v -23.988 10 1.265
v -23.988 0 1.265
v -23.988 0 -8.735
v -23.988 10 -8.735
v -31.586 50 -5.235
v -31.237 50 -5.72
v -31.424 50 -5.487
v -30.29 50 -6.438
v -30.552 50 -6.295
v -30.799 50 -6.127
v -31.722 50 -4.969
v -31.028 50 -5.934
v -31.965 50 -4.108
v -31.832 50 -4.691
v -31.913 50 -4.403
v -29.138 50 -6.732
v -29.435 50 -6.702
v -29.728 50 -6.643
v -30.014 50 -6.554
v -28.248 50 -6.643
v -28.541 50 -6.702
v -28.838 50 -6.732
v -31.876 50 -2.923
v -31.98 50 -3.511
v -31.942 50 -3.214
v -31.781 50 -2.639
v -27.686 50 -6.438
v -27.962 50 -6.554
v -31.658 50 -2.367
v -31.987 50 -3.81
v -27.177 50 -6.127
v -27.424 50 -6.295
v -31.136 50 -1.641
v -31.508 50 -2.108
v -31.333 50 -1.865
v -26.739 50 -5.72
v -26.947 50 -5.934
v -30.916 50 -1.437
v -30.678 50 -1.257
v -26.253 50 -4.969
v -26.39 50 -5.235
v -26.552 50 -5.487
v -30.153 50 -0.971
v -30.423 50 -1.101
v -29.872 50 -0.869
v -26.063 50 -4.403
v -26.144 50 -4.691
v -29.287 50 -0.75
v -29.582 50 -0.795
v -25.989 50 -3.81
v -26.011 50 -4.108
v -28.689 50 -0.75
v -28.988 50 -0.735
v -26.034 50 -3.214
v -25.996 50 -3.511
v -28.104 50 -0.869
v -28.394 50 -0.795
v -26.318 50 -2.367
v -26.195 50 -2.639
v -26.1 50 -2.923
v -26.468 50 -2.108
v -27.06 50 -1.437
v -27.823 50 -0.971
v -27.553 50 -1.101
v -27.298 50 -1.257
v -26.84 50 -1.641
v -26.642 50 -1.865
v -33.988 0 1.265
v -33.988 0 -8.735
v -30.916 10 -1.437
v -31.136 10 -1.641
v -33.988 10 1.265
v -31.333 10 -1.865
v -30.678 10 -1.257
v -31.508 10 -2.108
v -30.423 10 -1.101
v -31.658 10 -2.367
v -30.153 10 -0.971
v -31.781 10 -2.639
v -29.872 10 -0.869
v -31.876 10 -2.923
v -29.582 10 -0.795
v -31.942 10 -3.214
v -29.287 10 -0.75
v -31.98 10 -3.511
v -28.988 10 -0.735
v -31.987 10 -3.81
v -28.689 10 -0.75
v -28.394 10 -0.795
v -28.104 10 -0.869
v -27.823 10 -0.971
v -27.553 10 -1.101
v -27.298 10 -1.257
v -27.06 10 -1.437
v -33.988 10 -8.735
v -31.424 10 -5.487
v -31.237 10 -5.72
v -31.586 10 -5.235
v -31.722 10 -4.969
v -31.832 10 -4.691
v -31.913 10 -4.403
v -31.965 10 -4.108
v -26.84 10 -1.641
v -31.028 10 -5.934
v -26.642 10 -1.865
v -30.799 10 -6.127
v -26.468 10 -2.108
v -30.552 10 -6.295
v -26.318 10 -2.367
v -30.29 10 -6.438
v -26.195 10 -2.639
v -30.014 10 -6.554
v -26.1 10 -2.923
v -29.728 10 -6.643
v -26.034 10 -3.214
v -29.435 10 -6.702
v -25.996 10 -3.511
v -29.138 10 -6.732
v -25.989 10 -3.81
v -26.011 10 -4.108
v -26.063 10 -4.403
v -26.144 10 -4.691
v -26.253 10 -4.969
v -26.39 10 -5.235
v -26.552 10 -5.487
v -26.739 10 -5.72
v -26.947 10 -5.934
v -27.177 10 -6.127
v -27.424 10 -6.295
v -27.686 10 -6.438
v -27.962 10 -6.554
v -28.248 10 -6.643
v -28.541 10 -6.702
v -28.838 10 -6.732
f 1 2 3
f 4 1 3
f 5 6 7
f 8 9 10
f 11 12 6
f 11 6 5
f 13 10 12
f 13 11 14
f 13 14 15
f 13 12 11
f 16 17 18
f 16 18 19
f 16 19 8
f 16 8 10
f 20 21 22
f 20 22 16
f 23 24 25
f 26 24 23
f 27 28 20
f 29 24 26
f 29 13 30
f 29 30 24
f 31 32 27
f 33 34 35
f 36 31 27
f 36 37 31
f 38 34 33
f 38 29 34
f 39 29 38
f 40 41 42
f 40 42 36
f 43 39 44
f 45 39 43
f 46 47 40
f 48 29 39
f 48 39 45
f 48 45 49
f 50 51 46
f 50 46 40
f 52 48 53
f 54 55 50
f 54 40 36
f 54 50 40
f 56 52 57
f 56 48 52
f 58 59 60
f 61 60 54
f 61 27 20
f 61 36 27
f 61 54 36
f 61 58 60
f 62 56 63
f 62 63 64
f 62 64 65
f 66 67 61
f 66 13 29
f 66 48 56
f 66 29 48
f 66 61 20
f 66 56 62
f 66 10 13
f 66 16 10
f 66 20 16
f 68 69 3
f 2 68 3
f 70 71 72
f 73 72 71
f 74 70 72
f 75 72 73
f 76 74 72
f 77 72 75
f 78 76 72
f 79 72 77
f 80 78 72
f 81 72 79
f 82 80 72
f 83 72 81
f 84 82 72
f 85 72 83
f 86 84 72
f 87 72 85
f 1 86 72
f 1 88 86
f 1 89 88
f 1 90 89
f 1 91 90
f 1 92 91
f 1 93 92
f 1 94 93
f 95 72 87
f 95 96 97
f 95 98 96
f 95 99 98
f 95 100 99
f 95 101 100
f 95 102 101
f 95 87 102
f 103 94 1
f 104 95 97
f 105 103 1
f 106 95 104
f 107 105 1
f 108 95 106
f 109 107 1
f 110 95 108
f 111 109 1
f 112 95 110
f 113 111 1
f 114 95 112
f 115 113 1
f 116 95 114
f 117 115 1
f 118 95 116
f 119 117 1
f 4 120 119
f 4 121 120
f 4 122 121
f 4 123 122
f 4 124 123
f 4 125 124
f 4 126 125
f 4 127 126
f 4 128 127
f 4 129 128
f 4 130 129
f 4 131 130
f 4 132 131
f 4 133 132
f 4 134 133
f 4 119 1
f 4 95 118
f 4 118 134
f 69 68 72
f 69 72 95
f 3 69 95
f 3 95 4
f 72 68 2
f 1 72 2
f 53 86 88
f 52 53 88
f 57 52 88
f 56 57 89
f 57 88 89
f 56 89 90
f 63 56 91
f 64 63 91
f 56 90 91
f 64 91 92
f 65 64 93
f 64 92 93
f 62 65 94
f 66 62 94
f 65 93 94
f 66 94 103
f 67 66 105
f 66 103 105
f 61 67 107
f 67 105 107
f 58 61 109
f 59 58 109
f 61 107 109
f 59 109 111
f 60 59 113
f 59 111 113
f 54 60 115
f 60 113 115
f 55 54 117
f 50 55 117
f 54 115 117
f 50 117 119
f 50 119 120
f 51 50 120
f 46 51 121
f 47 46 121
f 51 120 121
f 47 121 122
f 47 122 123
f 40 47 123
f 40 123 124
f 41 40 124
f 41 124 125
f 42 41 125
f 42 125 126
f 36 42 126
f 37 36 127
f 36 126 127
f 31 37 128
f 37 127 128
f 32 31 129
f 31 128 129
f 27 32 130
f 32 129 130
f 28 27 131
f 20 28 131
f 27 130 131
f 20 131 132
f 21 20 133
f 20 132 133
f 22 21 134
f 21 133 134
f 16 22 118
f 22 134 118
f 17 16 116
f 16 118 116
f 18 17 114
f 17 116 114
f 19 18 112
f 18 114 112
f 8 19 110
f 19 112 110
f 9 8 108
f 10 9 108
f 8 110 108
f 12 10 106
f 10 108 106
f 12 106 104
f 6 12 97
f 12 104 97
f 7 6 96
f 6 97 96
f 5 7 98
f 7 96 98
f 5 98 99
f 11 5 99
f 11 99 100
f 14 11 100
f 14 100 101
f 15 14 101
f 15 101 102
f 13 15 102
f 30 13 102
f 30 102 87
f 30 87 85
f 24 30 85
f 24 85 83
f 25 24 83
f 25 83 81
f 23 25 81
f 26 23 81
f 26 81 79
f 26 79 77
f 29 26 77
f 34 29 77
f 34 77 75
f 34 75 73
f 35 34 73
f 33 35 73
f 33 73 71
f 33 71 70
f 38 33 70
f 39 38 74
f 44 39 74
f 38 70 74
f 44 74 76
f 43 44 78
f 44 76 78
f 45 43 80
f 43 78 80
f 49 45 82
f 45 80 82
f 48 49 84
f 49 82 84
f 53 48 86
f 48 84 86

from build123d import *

# Parameters (mm, degrees)
SKETCH_2_W      = 10
SKETCH_2_H      = 10
EXTRUDE_2_DEPTH = 10
SKETCH_3_R      = 3
EXTRUDE_3_DEPTH = 40


with BuildPart() as part:
    # 草图2 → 凸台-拉伸2 (new body)
    with BuildSketch(Plane(origin=(0, 0, 0), x_dir=(1, 0, 0), z_dir=(0, 1, 0))):
        with Locations((-28.987967914, 3.735294118)):
            Rectangle(SKETCH_2_W, SKETCH_2_H)
    extrude(amount=EXTRUDE_2_DEPTH)

    # 草图3 → 凸台-拉伸3 (add)
    with BuildSketch(Plane(origin=(0, 10, 0), x_dir=(1, 0, 0), z_dir=(0, 1, 0))):
        with Locations(Location((-28.987967914, 3.735294118, 0), (0, 0, 270))):
            Circle(SKETCH_3_R)
    extrude(amount=EXTRUDE_3_DEPTH)


solid = part.part
